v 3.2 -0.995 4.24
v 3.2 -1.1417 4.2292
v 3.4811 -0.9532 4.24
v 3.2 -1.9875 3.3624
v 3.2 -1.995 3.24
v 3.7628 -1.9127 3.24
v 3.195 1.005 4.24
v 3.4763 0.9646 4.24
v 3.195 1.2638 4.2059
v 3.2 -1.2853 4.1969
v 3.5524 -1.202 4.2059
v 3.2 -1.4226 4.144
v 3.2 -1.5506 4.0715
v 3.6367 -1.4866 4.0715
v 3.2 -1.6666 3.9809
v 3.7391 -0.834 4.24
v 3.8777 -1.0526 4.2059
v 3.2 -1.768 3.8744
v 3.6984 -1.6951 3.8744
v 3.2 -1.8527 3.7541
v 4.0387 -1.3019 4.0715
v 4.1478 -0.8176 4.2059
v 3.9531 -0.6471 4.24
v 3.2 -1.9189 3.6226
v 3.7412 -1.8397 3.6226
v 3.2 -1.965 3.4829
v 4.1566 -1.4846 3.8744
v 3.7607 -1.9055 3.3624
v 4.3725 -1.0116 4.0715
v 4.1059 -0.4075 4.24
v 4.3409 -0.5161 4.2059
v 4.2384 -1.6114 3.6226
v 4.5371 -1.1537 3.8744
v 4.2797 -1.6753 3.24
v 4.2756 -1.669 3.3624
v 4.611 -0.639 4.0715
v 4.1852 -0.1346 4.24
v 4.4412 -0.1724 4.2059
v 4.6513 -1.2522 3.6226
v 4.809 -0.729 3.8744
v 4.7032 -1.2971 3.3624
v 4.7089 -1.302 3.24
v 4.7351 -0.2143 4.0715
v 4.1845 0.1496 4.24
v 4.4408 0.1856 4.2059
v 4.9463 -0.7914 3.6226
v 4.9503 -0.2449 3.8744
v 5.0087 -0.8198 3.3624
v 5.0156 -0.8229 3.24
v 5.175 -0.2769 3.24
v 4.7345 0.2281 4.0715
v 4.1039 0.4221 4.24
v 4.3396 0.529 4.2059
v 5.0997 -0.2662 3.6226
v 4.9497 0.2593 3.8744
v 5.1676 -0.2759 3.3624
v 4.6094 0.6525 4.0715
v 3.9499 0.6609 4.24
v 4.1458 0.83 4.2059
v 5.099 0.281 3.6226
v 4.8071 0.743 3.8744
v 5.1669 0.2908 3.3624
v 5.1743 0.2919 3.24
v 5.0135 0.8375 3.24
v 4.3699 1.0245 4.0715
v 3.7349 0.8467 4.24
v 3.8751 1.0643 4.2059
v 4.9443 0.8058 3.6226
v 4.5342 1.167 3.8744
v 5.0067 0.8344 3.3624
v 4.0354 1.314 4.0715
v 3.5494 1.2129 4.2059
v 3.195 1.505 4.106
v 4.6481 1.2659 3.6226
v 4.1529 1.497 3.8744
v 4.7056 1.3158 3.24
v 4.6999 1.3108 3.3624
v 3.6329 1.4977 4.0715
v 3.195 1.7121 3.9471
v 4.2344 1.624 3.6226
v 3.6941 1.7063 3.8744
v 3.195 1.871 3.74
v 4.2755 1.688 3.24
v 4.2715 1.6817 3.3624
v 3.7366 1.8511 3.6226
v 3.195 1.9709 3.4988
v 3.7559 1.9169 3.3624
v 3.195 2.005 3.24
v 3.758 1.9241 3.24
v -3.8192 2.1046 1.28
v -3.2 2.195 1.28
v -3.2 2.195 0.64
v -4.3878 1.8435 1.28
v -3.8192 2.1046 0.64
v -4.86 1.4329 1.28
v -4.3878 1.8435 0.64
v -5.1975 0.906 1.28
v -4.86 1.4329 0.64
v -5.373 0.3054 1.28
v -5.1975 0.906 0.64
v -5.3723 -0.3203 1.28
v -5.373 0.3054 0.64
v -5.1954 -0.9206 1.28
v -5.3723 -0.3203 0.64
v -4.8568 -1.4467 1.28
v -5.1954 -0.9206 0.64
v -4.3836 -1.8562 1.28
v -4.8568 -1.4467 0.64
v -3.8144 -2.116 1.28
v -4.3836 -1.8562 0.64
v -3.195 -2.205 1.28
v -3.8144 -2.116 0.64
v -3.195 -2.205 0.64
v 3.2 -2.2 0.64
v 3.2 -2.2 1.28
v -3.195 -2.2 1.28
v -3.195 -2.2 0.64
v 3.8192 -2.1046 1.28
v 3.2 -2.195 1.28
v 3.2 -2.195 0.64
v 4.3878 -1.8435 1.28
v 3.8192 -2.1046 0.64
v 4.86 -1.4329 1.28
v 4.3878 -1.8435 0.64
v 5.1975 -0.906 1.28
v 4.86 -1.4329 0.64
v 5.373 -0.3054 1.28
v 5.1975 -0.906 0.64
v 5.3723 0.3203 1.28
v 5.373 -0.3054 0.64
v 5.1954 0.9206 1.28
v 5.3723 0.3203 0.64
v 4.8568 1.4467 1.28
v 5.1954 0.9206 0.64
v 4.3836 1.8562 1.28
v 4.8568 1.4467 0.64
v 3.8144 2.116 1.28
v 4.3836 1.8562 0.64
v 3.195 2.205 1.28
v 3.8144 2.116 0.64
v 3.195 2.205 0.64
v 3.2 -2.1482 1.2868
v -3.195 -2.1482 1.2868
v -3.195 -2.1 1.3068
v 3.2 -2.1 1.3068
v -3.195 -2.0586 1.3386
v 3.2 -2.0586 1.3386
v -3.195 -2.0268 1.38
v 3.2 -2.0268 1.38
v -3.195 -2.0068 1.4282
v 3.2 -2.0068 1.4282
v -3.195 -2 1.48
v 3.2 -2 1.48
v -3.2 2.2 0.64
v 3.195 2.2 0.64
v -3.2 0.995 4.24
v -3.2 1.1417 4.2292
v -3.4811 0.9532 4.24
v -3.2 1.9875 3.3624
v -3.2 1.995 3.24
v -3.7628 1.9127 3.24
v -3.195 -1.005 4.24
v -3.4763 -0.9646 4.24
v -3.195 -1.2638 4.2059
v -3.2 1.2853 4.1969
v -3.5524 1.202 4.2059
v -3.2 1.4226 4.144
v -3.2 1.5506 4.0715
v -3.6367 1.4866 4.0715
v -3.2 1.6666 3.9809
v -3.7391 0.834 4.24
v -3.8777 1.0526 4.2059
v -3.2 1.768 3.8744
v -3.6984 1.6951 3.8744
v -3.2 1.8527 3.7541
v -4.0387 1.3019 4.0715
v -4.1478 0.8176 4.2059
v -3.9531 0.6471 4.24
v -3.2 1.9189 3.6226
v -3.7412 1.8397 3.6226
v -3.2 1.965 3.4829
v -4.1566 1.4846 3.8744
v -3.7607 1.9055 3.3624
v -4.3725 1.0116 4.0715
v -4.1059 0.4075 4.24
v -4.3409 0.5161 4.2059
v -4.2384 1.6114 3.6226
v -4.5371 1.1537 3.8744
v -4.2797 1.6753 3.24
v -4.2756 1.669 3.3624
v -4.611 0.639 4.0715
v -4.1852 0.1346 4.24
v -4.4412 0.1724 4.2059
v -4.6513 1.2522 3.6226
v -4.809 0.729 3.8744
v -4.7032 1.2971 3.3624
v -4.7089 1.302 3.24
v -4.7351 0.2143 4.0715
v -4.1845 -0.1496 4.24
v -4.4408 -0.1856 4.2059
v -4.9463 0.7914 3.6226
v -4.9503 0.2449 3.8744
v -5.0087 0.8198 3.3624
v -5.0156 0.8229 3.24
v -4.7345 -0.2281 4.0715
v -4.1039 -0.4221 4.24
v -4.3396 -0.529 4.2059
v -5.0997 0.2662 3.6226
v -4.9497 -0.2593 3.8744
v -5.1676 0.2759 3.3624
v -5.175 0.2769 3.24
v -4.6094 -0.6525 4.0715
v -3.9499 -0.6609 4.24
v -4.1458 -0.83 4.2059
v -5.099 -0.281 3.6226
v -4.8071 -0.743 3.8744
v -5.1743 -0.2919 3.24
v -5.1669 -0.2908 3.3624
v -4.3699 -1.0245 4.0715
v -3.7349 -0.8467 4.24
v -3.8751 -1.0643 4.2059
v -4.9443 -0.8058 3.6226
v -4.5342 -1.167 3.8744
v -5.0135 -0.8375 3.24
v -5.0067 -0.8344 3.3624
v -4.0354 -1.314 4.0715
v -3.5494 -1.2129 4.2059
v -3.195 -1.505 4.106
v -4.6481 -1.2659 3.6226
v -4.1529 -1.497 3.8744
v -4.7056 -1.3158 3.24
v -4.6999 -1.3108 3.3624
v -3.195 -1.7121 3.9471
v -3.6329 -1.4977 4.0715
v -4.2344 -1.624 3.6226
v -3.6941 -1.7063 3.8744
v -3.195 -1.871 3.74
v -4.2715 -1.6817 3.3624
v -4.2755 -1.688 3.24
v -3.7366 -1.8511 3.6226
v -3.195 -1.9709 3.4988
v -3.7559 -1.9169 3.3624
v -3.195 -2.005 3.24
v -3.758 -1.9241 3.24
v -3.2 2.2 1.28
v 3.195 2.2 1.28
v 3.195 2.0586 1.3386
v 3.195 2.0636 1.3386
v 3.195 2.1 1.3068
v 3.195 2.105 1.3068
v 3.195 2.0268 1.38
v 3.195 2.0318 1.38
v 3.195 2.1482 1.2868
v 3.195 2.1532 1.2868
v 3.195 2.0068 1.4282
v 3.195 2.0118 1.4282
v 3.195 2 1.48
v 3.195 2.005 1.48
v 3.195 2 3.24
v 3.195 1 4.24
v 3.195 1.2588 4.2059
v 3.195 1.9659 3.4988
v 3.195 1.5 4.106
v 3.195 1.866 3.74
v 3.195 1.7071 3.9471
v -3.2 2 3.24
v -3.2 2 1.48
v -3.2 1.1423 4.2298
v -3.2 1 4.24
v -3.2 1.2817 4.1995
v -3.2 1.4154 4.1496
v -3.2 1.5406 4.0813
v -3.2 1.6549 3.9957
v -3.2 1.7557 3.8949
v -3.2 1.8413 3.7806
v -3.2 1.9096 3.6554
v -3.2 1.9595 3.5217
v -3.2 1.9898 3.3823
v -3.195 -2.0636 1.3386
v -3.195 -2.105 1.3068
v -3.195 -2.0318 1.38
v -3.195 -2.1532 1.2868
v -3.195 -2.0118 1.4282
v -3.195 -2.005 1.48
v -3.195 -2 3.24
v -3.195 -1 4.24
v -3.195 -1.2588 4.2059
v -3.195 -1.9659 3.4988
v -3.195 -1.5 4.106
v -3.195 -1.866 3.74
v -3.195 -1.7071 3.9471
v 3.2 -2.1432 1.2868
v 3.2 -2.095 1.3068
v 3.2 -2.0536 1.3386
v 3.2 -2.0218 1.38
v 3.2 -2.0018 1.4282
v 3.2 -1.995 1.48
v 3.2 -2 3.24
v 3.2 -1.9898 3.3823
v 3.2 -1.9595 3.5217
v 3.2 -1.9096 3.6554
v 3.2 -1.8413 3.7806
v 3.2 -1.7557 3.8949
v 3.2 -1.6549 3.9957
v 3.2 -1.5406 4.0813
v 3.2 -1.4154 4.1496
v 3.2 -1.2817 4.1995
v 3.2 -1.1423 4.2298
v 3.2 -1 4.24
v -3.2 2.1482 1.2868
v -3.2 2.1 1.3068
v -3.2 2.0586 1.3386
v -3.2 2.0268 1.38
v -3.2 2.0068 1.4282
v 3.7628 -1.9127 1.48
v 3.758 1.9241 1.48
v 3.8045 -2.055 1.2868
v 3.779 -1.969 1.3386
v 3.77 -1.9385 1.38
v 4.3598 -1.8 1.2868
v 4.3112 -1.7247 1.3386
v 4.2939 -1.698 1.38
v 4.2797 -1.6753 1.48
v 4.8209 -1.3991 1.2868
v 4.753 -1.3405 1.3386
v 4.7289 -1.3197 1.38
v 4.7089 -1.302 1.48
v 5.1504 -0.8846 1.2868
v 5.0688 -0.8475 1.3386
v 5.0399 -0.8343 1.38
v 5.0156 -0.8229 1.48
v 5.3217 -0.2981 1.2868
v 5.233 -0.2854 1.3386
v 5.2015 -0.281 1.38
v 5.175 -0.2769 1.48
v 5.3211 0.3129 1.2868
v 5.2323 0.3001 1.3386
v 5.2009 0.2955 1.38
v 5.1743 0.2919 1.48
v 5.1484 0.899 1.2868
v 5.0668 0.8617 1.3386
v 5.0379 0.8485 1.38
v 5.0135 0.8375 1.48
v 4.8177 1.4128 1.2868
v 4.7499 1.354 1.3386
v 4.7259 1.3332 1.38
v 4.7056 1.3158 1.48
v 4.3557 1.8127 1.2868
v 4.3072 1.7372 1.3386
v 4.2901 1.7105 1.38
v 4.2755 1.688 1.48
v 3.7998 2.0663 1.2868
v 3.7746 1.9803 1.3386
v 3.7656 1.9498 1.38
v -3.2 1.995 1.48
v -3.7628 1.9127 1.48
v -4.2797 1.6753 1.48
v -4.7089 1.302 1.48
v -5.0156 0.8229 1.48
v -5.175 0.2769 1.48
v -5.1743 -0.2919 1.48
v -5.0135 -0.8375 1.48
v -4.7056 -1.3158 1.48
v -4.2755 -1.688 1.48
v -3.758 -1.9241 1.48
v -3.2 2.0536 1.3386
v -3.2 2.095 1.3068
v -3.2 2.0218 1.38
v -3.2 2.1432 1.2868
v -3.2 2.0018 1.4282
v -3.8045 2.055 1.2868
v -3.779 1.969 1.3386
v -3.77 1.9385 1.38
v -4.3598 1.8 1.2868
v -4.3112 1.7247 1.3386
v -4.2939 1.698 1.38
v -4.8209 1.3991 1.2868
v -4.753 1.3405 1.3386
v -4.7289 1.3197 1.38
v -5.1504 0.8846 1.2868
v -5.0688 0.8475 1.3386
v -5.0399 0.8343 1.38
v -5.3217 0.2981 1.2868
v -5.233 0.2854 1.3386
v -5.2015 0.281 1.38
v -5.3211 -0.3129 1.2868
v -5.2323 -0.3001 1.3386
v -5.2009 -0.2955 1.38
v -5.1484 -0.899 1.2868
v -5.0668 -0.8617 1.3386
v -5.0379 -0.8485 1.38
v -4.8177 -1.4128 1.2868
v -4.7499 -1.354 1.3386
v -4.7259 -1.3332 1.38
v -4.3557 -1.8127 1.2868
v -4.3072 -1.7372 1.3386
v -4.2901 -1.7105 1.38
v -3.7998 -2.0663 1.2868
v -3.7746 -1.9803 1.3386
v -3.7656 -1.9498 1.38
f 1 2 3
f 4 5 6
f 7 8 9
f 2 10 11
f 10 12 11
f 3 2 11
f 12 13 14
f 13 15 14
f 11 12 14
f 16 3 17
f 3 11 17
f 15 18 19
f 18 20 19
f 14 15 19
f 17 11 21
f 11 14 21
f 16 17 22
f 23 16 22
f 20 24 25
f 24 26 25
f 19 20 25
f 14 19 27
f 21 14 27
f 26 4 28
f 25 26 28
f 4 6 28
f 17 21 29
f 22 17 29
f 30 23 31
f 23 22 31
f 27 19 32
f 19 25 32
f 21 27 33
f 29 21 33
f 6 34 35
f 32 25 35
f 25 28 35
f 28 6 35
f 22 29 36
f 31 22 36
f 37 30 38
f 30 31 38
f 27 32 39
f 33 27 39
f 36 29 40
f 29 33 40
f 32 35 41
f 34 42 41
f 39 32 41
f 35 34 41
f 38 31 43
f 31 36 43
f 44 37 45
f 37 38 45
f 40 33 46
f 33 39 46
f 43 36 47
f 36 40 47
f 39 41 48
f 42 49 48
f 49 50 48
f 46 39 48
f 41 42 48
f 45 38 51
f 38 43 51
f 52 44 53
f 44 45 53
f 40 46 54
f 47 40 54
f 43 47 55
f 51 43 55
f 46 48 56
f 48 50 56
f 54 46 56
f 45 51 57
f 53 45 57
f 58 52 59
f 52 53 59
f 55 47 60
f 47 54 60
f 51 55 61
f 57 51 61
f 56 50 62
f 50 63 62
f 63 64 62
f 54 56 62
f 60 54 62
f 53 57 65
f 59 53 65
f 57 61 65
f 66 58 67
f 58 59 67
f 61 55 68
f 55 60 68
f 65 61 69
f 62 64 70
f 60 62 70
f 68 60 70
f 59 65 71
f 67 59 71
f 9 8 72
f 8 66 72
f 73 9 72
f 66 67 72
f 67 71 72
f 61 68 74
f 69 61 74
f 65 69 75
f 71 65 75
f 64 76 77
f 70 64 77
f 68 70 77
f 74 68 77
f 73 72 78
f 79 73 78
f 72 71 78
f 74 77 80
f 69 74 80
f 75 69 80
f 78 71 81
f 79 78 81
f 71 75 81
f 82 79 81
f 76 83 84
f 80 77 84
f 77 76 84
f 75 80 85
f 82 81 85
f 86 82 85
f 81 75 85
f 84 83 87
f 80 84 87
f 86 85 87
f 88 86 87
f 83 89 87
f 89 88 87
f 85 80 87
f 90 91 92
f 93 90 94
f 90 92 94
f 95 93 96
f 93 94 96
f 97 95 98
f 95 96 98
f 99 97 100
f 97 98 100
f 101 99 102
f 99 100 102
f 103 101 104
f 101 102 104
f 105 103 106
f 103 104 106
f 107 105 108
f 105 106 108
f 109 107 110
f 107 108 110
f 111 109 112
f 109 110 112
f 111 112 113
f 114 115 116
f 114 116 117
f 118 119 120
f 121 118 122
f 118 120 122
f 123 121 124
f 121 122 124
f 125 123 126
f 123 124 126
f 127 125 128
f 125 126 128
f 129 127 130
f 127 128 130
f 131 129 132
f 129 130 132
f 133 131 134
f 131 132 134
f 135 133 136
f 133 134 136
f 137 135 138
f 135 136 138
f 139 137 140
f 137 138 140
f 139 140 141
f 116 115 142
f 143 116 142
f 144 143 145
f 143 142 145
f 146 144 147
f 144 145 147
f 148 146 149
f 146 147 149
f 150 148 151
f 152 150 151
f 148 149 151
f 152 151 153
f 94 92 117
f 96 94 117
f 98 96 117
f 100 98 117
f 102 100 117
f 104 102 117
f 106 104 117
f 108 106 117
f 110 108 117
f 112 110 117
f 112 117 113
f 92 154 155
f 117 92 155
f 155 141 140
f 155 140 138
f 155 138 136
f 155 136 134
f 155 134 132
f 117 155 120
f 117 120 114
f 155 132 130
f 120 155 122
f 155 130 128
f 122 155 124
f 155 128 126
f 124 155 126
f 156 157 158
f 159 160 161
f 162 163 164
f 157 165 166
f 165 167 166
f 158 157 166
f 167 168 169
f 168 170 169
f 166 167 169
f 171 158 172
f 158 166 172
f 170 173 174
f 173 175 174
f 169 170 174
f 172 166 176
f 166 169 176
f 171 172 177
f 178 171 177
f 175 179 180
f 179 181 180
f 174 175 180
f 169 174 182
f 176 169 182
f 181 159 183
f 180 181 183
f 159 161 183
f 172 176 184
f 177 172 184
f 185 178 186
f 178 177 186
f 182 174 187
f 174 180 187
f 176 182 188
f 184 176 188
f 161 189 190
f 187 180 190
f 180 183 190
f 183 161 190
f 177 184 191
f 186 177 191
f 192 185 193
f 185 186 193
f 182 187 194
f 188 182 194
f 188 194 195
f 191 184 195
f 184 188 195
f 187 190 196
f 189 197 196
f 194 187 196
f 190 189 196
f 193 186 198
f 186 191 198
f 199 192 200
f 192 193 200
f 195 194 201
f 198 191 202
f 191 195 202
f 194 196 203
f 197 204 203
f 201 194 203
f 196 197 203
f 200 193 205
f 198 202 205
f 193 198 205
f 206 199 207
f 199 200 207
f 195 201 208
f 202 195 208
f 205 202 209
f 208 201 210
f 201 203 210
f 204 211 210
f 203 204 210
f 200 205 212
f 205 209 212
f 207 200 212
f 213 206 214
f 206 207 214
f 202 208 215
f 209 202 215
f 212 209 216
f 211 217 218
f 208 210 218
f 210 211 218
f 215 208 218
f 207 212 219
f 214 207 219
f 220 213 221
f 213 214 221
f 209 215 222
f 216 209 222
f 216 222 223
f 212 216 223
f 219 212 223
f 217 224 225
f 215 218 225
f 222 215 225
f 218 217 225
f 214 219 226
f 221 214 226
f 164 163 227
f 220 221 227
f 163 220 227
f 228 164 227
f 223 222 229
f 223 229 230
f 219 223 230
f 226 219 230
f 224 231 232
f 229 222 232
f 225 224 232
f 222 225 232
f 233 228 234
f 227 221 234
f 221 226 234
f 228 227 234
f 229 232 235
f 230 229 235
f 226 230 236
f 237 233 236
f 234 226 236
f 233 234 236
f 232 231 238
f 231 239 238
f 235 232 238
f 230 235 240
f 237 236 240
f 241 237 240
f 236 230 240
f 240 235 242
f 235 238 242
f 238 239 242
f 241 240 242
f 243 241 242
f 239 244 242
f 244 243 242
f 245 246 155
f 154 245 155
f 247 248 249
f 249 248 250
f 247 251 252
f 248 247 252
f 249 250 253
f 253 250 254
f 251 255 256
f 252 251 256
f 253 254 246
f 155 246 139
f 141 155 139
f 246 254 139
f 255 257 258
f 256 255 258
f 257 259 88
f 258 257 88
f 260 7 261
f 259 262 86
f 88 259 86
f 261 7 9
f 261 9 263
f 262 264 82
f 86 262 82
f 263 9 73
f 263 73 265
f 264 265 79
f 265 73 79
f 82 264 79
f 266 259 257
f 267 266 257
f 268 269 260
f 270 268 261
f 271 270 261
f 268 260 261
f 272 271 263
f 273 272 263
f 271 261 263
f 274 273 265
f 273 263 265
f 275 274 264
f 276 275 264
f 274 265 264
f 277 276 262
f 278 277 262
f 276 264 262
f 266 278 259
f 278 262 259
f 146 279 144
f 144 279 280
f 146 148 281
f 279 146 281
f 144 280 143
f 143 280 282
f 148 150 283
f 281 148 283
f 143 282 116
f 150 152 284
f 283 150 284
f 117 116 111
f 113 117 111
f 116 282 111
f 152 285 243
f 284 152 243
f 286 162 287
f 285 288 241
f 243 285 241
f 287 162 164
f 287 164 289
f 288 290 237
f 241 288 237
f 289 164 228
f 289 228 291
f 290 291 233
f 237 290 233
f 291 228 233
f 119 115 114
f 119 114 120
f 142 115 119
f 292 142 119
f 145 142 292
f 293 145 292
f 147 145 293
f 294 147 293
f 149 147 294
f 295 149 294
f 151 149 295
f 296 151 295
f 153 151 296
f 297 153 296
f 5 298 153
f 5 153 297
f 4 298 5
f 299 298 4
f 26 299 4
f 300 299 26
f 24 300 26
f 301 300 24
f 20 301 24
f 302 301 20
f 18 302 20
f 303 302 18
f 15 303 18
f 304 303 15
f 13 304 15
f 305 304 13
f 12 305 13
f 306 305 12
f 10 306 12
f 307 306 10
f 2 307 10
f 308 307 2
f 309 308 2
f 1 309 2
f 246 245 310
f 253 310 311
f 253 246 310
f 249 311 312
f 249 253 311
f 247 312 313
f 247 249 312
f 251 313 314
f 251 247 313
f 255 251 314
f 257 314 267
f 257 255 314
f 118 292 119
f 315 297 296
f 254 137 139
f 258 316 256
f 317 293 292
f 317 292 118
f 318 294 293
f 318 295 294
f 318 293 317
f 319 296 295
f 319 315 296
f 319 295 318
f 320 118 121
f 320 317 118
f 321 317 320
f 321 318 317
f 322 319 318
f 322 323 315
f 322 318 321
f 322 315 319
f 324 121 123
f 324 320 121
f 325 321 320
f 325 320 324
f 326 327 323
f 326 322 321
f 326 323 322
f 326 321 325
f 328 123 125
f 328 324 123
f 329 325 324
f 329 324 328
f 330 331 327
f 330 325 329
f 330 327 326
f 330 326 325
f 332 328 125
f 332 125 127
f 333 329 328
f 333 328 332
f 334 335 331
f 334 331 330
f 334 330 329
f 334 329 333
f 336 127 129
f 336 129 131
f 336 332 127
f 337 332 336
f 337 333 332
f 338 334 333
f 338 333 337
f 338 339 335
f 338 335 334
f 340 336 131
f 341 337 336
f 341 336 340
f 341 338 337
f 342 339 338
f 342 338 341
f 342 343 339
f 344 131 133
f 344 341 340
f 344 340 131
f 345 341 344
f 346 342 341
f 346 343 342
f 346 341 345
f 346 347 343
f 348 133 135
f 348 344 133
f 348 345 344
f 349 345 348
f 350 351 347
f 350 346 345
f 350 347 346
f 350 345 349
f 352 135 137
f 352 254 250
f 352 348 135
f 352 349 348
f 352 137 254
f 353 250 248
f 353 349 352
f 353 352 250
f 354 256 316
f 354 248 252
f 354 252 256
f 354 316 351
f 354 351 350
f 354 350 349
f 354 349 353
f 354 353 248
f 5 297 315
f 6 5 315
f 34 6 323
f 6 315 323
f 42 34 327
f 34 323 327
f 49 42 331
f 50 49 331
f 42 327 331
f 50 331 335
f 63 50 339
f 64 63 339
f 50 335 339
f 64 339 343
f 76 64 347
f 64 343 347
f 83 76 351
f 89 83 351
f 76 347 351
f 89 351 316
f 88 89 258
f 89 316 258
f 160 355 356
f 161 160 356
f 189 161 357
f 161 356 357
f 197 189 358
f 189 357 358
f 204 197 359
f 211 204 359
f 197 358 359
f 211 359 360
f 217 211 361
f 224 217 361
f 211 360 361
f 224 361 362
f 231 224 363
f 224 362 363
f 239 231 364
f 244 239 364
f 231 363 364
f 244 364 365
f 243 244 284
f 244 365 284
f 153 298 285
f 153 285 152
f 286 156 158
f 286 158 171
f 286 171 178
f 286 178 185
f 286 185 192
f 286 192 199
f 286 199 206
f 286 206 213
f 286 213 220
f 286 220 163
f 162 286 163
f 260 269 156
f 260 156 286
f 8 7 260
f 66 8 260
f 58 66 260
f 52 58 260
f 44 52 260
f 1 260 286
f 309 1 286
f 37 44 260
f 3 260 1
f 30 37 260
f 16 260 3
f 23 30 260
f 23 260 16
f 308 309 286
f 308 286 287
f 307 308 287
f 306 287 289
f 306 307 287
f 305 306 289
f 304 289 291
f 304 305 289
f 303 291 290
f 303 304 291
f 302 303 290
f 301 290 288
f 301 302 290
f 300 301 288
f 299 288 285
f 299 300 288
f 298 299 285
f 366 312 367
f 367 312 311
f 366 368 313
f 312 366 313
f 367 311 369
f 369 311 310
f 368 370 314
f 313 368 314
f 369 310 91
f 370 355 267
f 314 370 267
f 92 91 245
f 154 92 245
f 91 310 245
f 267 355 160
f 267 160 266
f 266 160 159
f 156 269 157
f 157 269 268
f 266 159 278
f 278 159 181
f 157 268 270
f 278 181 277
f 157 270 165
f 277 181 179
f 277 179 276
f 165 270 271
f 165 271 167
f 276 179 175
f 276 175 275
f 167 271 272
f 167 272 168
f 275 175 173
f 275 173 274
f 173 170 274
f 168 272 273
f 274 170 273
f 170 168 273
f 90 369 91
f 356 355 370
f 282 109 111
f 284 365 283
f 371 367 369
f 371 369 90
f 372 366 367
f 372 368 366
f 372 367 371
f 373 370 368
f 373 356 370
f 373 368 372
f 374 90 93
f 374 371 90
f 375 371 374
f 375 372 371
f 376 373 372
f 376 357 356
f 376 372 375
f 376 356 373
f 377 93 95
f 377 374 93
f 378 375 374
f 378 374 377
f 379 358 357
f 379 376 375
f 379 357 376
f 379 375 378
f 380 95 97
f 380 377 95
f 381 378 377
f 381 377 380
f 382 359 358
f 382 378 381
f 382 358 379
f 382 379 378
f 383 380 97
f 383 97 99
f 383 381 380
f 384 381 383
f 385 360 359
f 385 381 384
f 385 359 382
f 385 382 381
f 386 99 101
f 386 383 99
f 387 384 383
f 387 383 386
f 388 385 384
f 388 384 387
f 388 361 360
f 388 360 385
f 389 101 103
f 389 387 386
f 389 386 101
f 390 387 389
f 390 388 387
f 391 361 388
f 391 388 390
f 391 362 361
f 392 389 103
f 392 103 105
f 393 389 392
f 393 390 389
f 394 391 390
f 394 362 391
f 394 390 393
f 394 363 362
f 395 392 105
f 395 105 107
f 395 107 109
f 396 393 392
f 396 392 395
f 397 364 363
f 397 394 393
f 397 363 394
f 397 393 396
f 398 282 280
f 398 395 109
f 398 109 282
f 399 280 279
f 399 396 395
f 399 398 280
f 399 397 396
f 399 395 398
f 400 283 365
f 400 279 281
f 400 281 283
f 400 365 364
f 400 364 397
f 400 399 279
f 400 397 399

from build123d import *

# Parameters (mm, degrees)
REVOLUTION001_ANGLE   = 180
CLONE_PLACEMENT_ANGLE = 180
PAD001_DEPTH          = 3.2


with BuildPart() as xtal_side001:
    # Sketch001 → Revolution001 (revolve)
    with BuildSketch(Plane(origin=(3.195, 0.005, 0), x_dir=(0, 1, 0), z_dir=(1, 0, 0))):
        with BuildLine():
            Line((0, 4.24), (-1, 4.24))
            ThreePointArc((-1, 4.24), (-1.707107, 3.947107), (-2, 3.24))
            Line((-2, 3.24), (-2, 1.48))
            ThreePointArc((-2.2, 1.28), (-2.058579, 1.338579), (-2, 1.48))
            Line((-2.2, 1.28), (-2.2, 0.64))
            Line((-2.2, 0.64), (0, 0.64))
            Line((0, 4.24), (0, 0.64))
        make_face()
    revolve(axis=Axis((3.195, 0.005, 0), (0, 0, 1)), revolution_arc=REVOLUTION001_ANGLE)


with BuildPart() as clone:
    # Clone base: copy of xtal-side001
    add(xtal_side001.part)


with BuildPart() as clone_1:
    # Clone placement: moved
    add(clone.part.moved(Location((0, 0, 0))).rotate(Axis((0, 0, 0), (0, 0, 1)), CLONE_PLACEMENT_ANGLE))


with BuildPart() as pad001:
    # Sketch002 → Pad001 (new body, symmetric)
    with BuildSketch(Plane.YZ):
        with BuildLine():
            Line((0, 4.24), (-1, 4.24))
            ThreePointArc((-1, 4.24), (-1.707107, 3.947107), (-2, 3.24))
            Line((-2, 3.24), (-2, 1.48))
            ThreePointArc((-2.2, 1.28), (-2.058579, 1.338579), (-2, 1.48))
            Line((-2.2, 1.28), (-2.2, 0.64))
            Line((-2.2, 0.64), (0, 0.64))
            Line((0, 4.24), (0, 0.64))
        make_face()
    extrude(amount=PAD001_DEPTH, both=True)


with BuildPart() as xtal_body:
    # Part__Mirroring: instance of Pad001
    add(pad001.part.mirror(Plane(origin=(0, 0, 0), x_dir=(1, 0, 0), z_dir=(0, 1, 0))))

    # Fusion: union Pad001
    add(pad001.part)

    # Fusion001: union Clone, xtal-side001
    add(clone_1.part)
    add(xtal_side001.part)


solid = xtal_body.part
